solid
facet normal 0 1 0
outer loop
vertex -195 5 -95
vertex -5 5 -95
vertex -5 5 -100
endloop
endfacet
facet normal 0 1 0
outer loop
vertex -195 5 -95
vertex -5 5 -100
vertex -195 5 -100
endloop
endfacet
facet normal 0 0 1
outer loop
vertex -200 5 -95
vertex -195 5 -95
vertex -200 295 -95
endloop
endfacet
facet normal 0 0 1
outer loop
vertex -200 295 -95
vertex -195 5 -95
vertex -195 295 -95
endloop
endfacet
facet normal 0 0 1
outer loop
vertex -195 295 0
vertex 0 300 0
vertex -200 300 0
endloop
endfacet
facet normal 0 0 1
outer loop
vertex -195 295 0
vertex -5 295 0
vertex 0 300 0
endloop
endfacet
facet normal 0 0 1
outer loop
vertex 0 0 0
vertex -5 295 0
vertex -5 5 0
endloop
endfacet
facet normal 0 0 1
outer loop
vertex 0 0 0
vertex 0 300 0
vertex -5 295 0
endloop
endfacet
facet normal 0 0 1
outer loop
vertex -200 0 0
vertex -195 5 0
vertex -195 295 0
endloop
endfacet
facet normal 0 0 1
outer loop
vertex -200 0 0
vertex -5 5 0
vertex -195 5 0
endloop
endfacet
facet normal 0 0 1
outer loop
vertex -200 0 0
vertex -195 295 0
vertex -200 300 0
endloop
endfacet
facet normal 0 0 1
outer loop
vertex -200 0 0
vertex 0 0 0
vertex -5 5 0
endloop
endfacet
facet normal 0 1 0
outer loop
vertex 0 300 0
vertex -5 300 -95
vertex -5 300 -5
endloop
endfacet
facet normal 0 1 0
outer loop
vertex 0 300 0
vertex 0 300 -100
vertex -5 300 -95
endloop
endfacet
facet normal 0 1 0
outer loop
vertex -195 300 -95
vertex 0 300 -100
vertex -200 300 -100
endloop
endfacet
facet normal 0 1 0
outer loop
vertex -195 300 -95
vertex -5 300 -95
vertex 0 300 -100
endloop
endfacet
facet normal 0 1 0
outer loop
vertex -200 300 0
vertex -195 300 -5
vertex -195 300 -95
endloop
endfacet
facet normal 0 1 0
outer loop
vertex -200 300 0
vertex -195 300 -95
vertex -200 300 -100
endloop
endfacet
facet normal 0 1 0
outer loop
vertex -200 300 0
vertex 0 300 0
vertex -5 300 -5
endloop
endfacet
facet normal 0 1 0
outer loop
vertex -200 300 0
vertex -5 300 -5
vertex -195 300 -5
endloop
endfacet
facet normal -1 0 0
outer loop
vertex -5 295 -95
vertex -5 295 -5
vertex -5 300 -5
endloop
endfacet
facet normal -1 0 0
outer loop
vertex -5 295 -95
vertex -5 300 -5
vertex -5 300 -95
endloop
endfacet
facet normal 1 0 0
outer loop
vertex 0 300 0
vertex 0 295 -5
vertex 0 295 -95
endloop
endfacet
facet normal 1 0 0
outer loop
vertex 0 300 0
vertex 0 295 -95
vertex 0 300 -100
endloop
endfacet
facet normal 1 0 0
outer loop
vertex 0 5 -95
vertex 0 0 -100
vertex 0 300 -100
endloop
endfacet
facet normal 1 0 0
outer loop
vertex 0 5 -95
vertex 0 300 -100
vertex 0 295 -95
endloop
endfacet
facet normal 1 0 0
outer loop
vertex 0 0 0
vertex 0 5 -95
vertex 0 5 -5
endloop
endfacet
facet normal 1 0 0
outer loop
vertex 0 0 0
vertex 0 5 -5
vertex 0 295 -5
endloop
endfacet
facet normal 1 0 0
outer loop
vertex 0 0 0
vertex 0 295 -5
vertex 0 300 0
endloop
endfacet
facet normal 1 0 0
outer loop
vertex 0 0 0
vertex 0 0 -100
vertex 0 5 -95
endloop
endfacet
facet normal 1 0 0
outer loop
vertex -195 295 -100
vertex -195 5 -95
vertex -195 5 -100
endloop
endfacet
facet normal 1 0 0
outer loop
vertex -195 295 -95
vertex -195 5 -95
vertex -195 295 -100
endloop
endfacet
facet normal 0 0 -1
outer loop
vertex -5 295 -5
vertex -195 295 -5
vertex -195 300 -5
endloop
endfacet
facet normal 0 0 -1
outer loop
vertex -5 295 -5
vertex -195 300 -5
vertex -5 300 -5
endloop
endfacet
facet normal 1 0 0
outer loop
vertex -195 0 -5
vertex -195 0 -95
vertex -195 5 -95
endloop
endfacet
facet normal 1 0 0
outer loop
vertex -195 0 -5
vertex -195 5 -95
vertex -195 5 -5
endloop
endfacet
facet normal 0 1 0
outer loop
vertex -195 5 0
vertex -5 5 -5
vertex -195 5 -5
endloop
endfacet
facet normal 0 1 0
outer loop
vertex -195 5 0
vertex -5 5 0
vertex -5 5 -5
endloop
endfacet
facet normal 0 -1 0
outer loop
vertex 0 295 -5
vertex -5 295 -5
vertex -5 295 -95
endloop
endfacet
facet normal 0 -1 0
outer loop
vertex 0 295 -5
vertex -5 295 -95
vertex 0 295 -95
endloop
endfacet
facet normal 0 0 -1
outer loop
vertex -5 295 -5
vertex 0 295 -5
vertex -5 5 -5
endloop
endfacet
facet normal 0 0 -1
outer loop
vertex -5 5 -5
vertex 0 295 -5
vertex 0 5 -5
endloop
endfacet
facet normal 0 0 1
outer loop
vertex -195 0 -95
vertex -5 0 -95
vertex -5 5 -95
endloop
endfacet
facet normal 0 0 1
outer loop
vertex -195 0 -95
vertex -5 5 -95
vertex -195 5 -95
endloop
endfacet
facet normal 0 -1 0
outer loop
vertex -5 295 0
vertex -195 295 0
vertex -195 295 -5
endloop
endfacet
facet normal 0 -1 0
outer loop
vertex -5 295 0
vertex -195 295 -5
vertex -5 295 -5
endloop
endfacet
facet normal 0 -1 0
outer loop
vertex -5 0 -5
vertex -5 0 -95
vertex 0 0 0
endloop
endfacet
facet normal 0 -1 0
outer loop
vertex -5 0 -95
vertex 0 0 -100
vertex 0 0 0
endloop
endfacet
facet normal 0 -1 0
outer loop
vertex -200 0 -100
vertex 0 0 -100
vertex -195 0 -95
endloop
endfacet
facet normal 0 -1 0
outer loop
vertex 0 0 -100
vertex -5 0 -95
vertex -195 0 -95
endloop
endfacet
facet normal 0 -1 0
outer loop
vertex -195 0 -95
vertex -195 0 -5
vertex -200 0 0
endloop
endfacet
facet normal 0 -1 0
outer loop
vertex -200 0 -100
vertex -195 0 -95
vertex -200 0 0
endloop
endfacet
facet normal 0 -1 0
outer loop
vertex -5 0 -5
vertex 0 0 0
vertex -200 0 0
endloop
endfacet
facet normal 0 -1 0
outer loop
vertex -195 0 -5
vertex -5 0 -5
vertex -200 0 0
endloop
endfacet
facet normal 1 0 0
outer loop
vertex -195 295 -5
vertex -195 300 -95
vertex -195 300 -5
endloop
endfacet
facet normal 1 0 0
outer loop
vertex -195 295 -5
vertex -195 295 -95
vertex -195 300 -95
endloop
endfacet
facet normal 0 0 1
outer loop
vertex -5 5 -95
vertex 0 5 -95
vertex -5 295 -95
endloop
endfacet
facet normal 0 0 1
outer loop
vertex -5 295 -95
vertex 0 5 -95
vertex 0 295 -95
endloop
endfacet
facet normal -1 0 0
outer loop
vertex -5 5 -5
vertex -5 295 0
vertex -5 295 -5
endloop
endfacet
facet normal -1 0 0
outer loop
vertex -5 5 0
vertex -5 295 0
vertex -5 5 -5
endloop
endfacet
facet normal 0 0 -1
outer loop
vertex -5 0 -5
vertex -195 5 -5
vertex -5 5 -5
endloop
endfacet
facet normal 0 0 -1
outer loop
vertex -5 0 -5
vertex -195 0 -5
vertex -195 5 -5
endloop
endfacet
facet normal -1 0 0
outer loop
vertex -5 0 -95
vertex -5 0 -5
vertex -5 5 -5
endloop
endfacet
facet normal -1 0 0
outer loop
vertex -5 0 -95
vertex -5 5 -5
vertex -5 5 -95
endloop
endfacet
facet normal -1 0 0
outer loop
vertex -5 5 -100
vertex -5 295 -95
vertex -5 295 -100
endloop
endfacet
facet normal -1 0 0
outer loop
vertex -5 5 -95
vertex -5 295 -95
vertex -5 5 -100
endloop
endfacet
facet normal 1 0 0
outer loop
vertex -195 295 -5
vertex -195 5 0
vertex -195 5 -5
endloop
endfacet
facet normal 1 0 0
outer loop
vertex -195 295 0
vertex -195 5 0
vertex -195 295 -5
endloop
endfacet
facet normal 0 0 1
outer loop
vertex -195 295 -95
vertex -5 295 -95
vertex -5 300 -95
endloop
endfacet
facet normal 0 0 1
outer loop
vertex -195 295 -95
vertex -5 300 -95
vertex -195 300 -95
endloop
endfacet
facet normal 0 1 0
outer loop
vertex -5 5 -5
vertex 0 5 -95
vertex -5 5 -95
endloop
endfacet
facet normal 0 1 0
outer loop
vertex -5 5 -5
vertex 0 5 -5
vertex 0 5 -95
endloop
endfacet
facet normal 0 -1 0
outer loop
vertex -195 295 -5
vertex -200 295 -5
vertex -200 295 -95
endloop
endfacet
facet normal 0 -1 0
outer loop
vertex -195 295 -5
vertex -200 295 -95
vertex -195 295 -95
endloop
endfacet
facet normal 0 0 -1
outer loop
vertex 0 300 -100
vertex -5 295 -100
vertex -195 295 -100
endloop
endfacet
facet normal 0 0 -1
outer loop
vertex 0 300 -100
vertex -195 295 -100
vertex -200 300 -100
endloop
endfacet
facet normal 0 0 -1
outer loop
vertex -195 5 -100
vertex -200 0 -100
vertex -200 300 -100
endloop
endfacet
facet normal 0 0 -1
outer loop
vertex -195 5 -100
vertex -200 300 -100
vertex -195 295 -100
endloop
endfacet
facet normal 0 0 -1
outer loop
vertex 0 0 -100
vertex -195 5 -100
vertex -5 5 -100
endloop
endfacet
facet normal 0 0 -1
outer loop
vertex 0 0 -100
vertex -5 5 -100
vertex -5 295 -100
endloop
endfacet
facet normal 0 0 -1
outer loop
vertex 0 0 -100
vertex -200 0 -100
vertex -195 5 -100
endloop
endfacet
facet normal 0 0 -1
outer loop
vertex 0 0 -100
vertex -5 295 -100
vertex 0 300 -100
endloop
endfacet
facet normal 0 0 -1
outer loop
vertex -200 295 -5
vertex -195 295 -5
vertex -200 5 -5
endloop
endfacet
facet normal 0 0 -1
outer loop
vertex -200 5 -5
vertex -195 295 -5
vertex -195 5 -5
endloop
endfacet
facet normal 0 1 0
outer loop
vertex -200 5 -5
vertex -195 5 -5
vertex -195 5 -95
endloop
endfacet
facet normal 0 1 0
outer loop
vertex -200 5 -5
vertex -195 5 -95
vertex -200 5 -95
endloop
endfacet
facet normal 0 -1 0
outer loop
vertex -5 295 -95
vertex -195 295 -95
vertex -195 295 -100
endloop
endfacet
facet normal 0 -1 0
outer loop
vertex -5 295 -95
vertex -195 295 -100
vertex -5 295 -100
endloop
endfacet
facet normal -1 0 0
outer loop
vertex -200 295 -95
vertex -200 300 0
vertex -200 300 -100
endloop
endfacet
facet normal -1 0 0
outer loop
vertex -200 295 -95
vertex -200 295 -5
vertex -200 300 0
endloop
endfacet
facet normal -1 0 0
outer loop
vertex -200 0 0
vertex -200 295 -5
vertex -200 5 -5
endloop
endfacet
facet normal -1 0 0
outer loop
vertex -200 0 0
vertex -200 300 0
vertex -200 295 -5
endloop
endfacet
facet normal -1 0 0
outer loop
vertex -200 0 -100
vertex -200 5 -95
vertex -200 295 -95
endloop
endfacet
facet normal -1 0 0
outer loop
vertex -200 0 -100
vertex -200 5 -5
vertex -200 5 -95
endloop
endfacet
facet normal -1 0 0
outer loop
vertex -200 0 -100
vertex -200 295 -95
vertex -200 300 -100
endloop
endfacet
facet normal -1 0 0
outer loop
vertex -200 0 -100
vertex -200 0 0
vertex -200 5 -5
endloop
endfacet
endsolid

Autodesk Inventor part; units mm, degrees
ref_plane "YZ Plane" through (0, 0, 0) normal (1, 0, 0) x (0, 1, 0)
ref_plane "XZ Plane" through (0, 0, 0) normal (0, 1, 0) x (-1, 0, 0)
ref_plane "XY Plane" through (0, 0, 0) normal (0, 0, 1) x (1, 0, 0)
sketch "Sketch1" plane through (0, 0, 0) normal (0, 1, 0) x (-1, 0, 0)
  line L0 (0, 0) -> (200, 0)
  line L1 (200, 0) -> (200, -100)
  line L2 (200, -100) -> (0, -100)
  line L3 (0, -100) -> (0, 0)
  point P0 (100, -50)
  dimension "d0" = 100
  dimension "d1" = 200
extrude "Extrusion1" add sketch "Sketch1" along normal blind 300
sketch "Sketch3" plane through (0, 0, 0) normal (0, 0, 1) x (1, 0, 0)
  line L0 (-200, 300) -> (0, 300) projected
  line L1 (-200, 300) -> (0, 300)
  line L2 (0, 300) -> (0, 0)
  line L3 (0, 0) -> (-200, 0)
  line L4 (-200, 0) -> (-200, 300)
  line L5 (-195, 295) -> (-5, 295)
  line L6 (-5, 295) -> (-5, 5)
  line L7 (-5, 5) -> (-195, 5)
  line L8 (-195, 5) -> (-195, 295)
  line L9 (-195, 295) -> (-5, 5) construction
  line L10 (-5, 295) -> (-195, 5) construction
  point P0 (-100, 150)
  dimension "d8" = 5
  dimension "d9" = 5
  dimension "d10" = 5
  dimension "d11" = 5
extrude "Extrusion2" cut sketch "Sketch3" against normal through all contours L5 L6 L7 L8
sketch "Sketch4" plane through (0, 0, 0) normal (1, 0, 0) x (0, 1, 0)
  line L0 (0, 0) -> (300, 0) projected
  line L1 (0, -100) -> (300, -100) projected
  line L2 (0, 0) -> (300, 0)
  line L3 (300, 0) -> (300, -100)
  line L4 (300, -100) -> (0, -100)
  line L5 (0, -100) -> (0, 0)
  line L6 (295, -5) -> (5, -5)
  line L7 (5, -5) -> (5, -95)
  line L8 (5, -95) -> (295, -95)
  line L9 (295, -95) -> (295, -5)
  line L10 (295, -5) -> (5, -95) construction
  line L11 (5, -5) -> (295, -95) construction
  point P0 (150, -50)
  dimension "d14" = 5
  dimension "d15" = 5
  dimension "d16" = 5
  dimension "d17" = 5
extrude "Extrusion3" cut sketch "Sketch4" against normal through all contours L9 L8 L7 L6
sketch "Sketch6" plane through (0, 0, 0) normal (0, 1, 0) x (-1, 0, 0)
  line L0 (195, -5) -> (5, -5)
  line L1 (5, -5) -> (5, -95)
  line L2 (5, -95) -> (195, -95)
  line L3 (195, -95) -> (195, -5)
  line L4 (195, -5) -> (5, -95) construction
  line L5 (5, -5) -> (195, -95) construction
  line L6 (200, 0) -> (200, -100) projected
  line L7 (0, 0) -> (200, 0) projected
  line L8 (0, -100) -> (0, 0) projected
  line L9 (200, -100) -> (0, -100) projected
  point P0 (100, -50)
  dimension "d20" = 5
  dimension "d21" = 5
  dimension "d22" = 5
  dimension "d23" = 5
extrude "Extrusion4" cut sketch "Sketch6" along normal through all contours L3 L2 L1 L0
properties part number "CubeSat Frame"
